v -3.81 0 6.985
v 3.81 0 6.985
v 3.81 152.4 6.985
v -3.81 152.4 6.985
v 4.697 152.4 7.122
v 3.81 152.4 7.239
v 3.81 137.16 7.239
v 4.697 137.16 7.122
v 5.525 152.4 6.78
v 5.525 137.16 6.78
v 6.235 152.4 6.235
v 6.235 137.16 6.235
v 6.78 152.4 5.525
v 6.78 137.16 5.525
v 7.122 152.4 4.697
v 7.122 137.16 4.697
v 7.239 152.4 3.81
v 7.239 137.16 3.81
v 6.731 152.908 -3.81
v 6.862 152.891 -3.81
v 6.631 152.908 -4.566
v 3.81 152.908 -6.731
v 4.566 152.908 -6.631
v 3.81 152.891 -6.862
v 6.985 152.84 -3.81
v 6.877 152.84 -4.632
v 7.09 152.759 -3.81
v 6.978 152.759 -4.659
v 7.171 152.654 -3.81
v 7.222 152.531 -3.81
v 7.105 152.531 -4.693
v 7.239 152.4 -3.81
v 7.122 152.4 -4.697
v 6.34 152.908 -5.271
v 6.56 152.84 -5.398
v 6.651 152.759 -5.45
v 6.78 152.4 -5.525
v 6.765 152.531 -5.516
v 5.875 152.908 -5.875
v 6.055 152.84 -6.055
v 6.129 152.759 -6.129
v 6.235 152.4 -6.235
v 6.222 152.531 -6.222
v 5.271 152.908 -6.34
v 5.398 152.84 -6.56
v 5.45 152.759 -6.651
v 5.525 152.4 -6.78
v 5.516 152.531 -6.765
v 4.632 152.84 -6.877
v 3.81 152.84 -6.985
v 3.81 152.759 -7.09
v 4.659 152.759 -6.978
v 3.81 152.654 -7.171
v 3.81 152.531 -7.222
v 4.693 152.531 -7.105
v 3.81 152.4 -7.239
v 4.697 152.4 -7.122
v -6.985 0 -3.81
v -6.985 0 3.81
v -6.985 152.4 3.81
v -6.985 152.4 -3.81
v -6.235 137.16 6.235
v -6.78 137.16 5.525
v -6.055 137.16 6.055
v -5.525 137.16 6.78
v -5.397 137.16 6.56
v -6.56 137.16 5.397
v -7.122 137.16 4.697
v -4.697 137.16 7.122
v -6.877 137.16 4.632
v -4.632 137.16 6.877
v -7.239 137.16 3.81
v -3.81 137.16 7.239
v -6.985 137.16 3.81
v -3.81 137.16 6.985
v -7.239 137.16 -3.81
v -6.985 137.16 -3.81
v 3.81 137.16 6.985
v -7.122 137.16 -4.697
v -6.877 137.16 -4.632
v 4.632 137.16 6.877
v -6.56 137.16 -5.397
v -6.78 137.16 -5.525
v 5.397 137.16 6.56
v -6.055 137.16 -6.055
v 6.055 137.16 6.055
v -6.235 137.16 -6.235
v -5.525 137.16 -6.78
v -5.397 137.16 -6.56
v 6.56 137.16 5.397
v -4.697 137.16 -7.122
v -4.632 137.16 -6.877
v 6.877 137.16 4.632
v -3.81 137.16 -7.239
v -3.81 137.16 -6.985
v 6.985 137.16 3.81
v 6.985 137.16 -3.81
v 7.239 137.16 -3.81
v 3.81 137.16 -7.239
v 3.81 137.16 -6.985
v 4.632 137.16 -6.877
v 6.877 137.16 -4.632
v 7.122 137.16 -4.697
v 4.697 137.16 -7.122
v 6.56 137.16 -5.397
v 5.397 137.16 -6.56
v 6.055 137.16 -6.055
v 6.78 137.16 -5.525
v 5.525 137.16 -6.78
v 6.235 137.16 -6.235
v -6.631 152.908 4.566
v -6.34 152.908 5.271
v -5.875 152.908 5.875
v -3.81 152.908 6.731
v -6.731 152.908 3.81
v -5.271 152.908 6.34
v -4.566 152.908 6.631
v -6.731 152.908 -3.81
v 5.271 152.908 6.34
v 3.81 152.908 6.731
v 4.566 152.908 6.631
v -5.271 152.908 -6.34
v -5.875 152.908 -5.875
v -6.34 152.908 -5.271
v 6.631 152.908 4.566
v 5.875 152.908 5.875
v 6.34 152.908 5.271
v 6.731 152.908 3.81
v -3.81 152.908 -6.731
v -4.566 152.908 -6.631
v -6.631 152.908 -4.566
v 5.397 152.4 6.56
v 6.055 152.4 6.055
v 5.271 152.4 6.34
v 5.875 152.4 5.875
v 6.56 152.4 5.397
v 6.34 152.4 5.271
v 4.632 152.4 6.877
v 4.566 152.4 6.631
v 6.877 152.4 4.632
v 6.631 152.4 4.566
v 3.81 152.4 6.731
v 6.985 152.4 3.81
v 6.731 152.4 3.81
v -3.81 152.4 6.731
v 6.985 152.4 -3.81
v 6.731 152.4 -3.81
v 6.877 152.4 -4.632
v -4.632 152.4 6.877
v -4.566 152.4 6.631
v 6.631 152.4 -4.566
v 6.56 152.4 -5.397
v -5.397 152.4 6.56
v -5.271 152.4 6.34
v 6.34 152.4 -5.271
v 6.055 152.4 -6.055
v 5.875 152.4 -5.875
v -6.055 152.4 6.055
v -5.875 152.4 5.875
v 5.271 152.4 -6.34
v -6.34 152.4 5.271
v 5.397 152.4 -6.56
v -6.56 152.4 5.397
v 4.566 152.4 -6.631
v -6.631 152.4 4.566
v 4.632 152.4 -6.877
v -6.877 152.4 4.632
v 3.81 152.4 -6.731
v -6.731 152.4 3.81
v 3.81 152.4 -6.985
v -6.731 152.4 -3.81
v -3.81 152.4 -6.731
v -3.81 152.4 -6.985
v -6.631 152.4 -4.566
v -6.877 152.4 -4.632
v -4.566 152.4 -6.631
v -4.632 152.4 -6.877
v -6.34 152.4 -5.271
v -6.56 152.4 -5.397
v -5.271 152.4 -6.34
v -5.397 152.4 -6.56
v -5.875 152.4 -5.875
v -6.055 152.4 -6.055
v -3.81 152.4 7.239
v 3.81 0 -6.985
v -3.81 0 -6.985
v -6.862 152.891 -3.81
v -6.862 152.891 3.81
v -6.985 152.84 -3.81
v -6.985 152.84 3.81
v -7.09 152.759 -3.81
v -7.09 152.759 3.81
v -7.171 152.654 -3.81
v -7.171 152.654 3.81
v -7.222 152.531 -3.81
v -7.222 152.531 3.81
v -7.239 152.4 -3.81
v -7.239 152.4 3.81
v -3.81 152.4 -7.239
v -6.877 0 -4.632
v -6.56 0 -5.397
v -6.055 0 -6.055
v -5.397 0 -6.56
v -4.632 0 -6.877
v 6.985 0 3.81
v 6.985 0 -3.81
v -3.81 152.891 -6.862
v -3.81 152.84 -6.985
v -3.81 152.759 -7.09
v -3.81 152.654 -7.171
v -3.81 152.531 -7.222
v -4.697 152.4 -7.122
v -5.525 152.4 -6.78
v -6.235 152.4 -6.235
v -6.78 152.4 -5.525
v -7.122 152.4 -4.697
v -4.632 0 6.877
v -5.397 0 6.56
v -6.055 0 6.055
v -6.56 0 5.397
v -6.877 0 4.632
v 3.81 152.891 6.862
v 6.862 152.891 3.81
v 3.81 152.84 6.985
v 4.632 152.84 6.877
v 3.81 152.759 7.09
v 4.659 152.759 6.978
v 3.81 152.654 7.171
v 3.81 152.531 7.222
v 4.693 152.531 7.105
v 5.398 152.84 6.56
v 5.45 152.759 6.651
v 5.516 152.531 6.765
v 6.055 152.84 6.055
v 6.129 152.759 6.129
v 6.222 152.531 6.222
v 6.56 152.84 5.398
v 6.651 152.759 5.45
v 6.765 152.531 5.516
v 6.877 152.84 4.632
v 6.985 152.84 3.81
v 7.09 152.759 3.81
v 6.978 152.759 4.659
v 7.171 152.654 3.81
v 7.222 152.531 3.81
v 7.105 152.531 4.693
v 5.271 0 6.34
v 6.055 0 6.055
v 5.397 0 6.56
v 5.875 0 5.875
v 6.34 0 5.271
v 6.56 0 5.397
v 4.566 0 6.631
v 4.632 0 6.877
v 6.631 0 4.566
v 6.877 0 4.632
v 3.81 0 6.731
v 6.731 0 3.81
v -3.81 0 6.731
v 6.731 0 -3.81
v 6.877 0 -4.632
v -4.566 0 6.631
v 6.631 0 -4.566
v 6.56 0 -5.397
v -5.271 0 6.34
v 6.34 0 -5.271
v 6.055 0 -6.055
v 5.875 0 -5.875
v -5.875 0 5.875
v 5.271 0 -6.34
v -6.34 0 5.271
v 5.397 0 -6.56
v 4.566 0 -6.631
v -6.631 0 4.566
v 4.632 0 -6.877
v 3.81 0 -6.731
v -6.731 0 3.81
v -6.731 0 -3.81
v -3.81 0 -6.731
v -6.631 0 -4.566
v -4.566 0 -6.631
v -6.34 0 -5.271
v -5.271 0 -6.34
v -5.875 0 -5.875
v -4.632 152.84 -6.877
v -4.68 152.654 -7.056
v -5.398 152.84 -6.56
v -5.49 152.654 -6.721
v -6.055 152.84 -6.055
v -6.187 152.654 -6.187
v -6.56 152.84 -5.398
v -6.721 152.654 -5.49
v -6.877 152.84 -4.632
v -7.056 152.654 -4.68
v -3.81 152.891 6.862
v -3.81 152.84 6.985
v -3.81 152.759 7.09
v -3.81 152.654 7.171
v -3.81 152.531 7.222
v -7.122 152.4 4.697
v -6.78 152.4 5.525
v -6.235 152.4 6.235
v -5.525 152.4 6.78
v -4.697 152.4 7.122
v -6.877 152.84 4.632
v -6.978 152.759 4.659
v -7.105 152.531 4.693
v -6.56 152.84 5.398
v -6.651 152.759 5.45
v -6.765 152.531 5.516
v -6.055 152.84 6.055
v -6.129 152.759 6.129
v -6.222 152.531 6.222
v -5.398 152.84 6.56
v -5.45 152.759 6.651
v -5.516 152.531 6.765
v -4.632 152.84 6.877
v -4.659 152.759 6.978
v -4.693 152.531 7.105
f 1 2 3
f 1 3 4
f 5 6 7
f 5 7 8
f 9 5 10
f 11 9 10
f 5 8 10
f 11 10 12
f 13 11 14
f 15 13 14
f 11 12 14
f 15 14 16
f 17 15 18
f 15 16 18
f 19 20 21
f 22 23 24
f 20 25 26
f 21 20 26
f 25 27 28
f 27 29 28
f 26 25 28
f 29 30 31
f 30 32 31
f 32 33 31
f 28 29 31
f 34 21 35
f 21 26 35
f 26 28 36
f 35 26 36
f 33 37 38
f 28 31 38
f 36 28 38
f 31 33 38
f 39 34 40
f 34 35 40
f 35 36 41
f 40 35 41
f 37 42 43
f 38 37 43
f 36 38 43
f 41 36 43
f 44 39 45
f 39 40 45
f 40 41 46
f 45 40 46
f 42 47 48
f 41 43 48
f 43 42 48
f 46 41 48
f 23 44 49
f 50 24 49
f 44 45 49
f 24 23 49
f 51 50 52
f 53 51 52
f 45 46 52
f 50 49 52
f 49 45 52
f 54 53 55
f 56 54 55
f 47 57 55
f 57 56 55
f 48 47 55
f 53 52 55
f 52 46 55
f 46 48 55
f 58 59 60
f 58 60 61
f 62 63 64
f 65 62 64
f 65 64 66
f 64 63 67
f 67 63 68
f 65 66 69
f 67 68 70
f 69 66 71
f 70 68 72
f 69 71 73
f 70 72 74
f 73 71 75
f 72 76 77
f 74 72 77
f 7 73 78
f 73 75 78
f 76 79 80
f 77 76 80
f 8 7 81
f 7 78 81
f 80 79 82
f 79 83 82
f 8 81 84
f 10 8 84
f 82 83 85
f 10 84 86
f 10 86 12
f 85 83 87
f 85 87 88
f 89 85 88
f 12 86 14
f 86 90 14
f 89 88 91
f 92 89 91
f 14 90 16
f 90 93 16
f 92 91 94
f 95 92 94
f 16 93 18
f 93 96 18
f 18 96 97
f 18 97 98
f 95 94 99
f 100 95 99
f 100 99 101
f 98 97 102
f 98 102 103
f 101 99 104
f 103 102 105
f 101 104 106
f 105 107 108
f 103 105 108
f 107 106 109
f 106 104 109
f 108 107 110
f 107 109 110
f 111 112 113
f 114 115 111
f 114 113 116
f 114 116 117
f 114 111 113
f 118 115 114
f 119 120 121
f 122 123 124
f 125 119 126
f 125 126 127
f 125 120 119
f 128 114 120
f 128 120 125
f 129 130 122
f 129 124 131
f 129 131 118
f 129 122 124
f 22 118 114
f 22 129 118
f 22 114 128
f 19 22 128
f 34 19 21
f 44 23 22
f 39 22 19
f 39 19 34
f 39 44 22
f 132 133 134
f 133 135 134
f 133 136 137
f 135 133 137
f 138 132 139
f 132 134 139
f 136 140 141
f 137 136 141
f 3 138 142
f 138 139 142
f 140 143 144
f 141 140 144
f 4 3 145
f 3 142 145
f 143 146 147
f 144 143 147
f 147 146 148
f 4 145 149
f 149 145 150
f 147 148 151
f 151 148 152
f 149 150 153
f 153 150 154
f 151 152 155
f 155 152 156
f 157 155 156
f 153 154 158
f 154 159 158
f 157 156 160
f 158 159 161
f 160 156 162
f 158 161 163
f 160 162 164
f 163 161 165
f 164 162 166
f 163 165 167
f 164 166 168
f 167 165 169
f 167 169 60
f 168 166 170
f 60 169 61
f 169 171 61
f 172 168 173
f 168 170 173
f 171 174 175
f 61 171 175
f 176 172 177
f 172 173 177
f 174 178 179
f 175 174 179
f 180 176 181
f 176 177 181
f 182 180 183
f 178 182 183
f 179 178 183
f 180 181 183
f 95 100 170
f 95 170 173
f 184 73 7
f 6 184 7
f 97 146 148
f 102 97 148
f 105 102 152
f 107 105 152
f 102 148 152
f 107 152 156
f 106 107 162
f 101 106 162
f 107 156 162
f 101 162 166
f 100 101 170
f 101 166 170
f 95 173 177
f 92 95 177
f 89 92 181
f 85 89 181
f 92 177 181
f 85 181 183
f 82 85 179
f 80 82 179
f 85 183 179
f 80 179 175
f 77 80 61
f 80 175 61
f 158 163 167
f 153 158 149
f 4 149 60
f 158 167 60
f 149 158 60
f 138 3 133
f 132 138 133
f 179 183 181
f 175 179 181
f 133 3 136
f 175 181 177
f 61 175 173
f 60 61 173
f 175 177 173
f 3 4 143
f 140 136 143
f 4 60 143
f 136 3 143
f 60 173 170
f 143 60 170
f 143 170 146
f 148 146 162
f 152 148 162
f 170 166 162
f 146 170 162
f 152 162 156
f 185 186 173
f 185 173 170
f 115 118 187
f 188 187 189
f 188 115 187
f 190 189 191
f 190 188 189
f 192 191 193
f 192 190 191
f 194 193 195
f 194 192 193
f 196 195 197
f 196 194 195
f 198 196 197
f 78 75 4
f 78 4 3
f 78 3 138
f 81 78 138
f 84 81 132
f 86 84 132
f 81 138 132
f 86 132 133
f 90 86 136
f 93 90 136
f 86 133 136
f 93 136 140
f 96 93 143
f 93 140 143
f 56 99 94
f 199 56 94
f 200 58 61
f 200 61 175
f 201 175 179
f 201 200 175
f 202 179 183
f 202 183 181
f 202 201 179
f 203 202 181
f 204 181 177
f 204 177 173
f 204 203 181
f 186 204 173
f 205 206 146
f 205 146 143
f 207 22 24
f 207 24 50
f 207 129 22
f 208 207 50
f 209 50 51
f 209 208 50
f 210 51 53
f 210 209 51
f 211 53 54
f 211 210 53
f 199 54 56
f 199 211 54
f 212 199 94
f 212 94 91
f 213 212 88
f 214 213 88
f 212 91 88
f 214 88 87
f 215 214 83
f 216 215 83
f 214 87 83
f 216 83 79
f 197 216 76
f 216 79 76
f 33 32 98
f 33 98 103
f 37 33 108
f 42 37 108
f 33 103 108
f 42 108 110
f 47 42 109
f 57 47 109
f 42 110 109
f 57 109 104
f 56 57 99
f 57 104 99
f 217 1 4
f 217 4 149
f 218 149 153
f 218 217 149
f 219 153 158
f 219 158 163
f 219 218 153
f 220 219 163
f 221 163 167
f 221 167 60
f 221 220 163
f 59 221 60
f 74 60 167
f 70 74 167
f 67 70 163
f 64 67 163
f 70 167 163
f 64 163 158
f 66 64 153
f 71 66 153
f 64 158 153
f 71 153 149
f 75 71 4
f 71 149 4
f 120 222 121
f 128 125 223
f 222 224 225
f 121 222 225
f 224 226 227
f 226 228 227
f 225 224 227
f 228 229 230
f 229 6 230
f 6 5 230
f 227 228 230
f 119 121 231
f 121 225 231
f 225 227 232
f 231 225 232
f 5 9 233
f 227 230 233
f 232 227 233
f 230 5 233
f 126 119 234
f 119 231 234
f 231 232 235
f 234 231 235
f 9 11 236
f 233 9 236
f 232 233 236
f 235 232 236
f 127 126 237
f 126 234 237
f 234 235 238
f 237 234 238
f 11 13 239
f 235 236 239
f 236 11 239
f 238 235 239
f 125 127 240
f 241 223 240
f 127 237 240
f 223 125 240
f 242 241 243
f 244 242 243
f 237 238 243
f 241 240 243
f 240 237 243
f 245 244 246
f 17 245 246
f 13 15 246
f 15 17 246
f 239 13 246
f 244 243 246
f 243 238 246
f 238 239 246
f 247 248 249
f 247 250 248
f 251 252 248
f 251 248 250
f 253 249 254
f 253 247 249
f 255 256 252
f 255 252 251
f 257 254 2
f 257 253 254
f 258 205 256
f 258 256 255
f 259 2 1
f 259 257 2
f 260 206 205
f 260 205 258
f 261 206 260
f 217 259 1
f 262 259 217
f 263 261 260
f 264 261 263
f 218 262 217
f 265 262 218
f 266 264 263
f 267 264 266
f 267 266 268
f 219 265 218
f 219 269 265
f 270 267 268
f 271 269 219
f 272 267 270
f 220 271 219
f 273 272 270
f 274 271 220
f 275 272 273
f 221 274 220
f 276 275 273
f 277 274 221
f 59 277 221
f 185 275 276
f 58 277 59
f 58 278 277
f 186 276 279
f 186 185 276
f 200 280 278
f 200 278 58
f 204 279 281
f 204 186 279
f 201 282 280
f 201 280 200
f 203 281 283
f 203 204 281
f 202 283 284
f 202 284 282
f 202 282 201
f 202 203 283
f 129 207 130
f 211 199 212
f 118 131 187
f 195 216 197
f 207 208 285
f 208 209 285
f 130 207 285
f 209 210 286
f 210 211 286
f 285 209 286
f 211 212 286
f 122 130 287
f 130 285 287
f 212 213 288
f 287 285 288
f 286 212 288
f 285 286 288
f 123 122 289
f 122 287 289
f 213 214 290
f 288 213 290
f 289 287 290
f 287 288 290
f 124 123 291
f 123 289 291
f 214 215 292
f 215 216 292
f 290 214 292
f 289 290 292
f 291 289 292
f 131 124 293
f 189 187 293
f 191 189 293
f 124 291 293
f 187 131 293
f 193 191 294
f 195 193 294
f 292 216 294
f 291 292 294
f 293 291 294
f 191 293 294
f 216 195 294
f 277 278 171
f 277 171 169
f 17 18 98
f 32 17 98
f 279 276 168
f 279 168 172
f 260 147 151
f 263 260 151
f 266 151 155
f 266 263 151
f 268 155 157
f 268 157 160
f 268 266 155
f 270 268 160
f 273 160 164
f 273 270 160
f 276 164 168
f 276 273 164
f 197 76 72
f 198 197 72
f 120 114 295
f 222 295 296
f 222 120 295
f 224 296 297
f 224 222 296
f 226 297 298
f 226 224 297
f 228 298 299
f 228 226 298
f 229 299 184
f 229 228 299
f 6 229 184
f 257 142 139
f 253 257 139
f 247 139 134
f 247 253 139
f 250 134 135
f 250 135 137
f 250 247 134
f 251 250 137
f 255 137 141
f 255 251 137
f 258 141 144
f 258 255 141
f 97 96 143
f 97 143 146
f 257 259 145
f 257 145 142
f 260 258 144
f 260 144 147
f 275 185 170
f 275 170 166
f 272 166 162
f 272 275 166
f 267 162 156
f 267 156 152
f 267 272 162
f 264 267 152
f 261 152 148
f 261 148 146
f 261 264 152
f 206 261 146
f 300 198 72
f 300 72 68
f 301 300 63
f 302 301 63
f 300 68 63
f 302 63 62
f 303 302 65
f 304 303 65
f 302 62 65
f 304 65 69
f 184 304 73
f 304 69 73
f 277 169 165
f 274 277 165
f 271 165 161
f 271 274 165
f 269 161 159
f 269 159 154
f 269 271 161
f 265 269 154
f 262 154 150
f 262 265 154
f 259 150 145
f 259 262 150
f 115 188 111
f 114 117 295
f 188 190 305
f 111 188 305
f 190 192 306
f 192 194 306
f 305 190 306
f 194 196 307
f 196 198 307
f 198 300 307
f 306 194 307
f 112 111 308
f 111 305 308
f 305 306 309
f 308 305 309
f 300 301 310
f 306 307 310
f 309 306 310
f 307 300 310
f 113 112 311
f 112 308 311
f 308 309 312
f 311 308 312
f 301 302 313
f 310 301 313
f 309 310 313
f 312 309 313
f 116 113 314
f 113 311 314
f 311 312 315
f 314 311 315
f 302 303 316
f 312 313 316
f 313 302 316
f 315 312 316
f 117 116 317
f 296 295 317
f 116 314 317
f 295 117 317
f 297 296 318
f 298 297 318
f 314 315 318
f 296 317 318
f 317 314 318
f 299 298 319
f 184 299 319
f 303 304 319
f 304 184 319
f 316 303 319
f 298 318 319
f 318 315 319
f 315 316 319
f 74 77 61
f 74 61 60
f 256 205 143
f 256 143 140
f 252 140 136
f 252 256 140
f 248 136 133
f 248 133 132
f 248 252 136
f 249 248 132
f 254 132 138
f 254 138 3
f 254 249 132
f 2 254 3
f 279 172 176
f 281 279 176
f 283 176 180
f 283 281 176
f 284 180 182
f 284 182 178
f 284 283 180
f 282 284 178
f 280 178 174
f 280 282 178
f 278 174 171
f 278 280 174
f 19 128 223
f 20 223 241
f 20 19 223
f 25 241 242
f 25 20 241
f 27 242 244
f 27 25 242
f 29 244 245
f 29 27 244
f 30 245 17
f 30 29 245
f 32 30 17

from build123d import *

# Parameters (mm, degrees)
BOSS_EXTRUDE1_DEPTH = 152.4
BOSS_EXTRUDE2_DEPTH = 15.24
BOSS_EXTRUDE3_DEPTH = 0.508
FILLET1_R           = 0.508


with BuildPart() as part:
    # Sketch1 → Boss-Extrude1 (new body)
    with BuildSketch(Plane(origin=(0, 0, 0), x_dir=(1, 0, 0), z_dir=(0, 1, 0))):
        with BuildLine():
            Line((3.81, -6.985), (-3.81, -6.985))
            ThreePointArc((-3.81, -6.985), (-6.05506403, -6.05506403), (-6.985, -3.81))
            Line((-6.985, -3.81), (-6.985, 3.81))
            ThreePointArc((-6.985, 3.81), (-6.05506403, 6.05506403), (-3.81, 6.985))
            Line((-3.81, 6.985), (3.81, 6.985))
            ThreePointArc((3.81, 6.985), (6.05506403, 6.05506403), (6.985, 3.81))
            Line((6.985, 3.81), (6.985, -3.81))
            ThreePointArc((6.985, -3.81), (6.05506403, -6.05506403), (3.81, -6.985))
        make_face()
        with BuildLine():
            Line((3.81, 6.731), (-3.81, 6.731))
            ThreePointArc((-3.81, 6.731), (-5.875458908, 5.875458908), (-6.731, 3.81))
            Line((-6.731, 3.81), (-6.731, -3.81))
            ThreePointArc((-6.731, -3.81), (-5.875458908, -5.875458908), (-3.81, -6.731))
            Line((-3.81, -6.731), (3.81, -6.731))
            ThreePointArc((3.81, -6.731), (5.875458908, -5.875458908), (6.731, -3.81))
            Line((6.731, -3.81), (6.731, 3.81))
            ThreePointArc((6.731, 3.81), (5.875458908, 5.875458908), (3.81, 6.731))
        make_face(mode=Mode.SUBTRACT)
    extrude(amount=BOSS_EXTRUDE1_DEPTH)


with BuildPart() as body_2:
    # Sketch2 → Boss-Extrude2 (new body)
    with BuildSketch(Plane(origin=(0, 152.4, 0), x_dir=(1, 0, 0), z_dir=(0, 1, 0))):
        with BuildLine():
            Line((-7.239, 3.81), (-7.239, -3.81))
            ThreePointArc((-7.239, -3.81), (-6.234669153, -6.234669153), (-3.81, -7.239))
            Line((-3.81, -7.239), (3.81, -7.239))
            ThreePointArc((3.81, -7.239), (6.234669153, -6.234669153), (7.239, -3.81))
            Line((7.239, -3.81), (7.239, 3.81))
            ThreePointArc((7.239, 3.81), (6.234669153, 6.234669153), (3.81, 7.239))
            Line((3.81, 7.239), (-3.81, 7.239))
            ThreePointArc((-3.81, 7.239), (-6.234669153, 6.234669153), (-7.239, 3.81))
        make_face()
        with BuildLine():
            Line((-3.81, -6.985), (3.81, -6.985))
            ThreePointArc((3.81, -6.985), (6.05506403, -6.05506403), (6.985, -3.81))
            Line((6.985, -3.81), (6.985, 3.81))
            ThreePointArc((6.985, 3.81), (6.05506403, 6.05506403), (3.81, 6.985))
            Line((3.81, 6.985), (-3.81, 6.985))
            ThreePointArc((-3.81, 6.985), (-6.05506403, 6.05506403), (-6.985, 3.81))
            Line((-6.985, 3.81), (-6.985, -3.81))
            ThreePointArc((-6.985, -3.81), (-6.05506403, -6.05506403), (-3.81, -6.985))
        make_face(mode=Mode.SUBTRACT)
    extrude(amount=-BOSS_EXTRUDE2_DEPTH)

    # Sketch3 → Boss-Extrude3 (add)
    with BuildSketch(Plane(origin=(0, 152.4, 0), x_dir=(1, 0, 0), z_dir=(0, 1, 0))):
        with BuildLine():
            Line((-7.239, 3.81), (-7.239, -3.81))
            ThreePointArc((-7.239, -3.81), (-6.234669153, -6.234669153), (-3.81, -7.239))
            Line((-3.81, -7.239), (3.81, -7.239))
            ThreePointArc((3.81, -7.239), (6.234669153, -6.234669153), (7.239, -3.81))
            Line((7.239, -3.81), (7.239, 3.81))
            ThreePointArc((7.239, 3.81), (6.234669153, 6.234669153), (3.81, 7.239))
            Line((3.81, 7.239), (-3.81, 7.239))
            ThreePointArc((-3.81, 7.239), (-6.234669153, 6.234669153), (-7.239, 3.81))
        make_face()
    extrude(amount=BOSS_EXTRUDE3_DEPTH)

    # Fillet1
    fillet1_edges = [body_2.edges().sort_by_distance(p)[0] for p in [
        (-6.234669153, 152.908, -6.234669153),
        (-7.239, 152.908, 0),
        (-6.234669153, 152.908, 6.234669153),
        (0, 152.908, 7.239),
        (6.234669153, 152.908, 6.234669153),
        (7.239, 152.908, 0),
        (6.234669153, 152.908, -6.234669153),
        (0, 152.908, -7.239),
    ]]
    fillet(fillet1_edges, radius=FILLET1_R)


solid = Compound([part.part, body_2.part])
